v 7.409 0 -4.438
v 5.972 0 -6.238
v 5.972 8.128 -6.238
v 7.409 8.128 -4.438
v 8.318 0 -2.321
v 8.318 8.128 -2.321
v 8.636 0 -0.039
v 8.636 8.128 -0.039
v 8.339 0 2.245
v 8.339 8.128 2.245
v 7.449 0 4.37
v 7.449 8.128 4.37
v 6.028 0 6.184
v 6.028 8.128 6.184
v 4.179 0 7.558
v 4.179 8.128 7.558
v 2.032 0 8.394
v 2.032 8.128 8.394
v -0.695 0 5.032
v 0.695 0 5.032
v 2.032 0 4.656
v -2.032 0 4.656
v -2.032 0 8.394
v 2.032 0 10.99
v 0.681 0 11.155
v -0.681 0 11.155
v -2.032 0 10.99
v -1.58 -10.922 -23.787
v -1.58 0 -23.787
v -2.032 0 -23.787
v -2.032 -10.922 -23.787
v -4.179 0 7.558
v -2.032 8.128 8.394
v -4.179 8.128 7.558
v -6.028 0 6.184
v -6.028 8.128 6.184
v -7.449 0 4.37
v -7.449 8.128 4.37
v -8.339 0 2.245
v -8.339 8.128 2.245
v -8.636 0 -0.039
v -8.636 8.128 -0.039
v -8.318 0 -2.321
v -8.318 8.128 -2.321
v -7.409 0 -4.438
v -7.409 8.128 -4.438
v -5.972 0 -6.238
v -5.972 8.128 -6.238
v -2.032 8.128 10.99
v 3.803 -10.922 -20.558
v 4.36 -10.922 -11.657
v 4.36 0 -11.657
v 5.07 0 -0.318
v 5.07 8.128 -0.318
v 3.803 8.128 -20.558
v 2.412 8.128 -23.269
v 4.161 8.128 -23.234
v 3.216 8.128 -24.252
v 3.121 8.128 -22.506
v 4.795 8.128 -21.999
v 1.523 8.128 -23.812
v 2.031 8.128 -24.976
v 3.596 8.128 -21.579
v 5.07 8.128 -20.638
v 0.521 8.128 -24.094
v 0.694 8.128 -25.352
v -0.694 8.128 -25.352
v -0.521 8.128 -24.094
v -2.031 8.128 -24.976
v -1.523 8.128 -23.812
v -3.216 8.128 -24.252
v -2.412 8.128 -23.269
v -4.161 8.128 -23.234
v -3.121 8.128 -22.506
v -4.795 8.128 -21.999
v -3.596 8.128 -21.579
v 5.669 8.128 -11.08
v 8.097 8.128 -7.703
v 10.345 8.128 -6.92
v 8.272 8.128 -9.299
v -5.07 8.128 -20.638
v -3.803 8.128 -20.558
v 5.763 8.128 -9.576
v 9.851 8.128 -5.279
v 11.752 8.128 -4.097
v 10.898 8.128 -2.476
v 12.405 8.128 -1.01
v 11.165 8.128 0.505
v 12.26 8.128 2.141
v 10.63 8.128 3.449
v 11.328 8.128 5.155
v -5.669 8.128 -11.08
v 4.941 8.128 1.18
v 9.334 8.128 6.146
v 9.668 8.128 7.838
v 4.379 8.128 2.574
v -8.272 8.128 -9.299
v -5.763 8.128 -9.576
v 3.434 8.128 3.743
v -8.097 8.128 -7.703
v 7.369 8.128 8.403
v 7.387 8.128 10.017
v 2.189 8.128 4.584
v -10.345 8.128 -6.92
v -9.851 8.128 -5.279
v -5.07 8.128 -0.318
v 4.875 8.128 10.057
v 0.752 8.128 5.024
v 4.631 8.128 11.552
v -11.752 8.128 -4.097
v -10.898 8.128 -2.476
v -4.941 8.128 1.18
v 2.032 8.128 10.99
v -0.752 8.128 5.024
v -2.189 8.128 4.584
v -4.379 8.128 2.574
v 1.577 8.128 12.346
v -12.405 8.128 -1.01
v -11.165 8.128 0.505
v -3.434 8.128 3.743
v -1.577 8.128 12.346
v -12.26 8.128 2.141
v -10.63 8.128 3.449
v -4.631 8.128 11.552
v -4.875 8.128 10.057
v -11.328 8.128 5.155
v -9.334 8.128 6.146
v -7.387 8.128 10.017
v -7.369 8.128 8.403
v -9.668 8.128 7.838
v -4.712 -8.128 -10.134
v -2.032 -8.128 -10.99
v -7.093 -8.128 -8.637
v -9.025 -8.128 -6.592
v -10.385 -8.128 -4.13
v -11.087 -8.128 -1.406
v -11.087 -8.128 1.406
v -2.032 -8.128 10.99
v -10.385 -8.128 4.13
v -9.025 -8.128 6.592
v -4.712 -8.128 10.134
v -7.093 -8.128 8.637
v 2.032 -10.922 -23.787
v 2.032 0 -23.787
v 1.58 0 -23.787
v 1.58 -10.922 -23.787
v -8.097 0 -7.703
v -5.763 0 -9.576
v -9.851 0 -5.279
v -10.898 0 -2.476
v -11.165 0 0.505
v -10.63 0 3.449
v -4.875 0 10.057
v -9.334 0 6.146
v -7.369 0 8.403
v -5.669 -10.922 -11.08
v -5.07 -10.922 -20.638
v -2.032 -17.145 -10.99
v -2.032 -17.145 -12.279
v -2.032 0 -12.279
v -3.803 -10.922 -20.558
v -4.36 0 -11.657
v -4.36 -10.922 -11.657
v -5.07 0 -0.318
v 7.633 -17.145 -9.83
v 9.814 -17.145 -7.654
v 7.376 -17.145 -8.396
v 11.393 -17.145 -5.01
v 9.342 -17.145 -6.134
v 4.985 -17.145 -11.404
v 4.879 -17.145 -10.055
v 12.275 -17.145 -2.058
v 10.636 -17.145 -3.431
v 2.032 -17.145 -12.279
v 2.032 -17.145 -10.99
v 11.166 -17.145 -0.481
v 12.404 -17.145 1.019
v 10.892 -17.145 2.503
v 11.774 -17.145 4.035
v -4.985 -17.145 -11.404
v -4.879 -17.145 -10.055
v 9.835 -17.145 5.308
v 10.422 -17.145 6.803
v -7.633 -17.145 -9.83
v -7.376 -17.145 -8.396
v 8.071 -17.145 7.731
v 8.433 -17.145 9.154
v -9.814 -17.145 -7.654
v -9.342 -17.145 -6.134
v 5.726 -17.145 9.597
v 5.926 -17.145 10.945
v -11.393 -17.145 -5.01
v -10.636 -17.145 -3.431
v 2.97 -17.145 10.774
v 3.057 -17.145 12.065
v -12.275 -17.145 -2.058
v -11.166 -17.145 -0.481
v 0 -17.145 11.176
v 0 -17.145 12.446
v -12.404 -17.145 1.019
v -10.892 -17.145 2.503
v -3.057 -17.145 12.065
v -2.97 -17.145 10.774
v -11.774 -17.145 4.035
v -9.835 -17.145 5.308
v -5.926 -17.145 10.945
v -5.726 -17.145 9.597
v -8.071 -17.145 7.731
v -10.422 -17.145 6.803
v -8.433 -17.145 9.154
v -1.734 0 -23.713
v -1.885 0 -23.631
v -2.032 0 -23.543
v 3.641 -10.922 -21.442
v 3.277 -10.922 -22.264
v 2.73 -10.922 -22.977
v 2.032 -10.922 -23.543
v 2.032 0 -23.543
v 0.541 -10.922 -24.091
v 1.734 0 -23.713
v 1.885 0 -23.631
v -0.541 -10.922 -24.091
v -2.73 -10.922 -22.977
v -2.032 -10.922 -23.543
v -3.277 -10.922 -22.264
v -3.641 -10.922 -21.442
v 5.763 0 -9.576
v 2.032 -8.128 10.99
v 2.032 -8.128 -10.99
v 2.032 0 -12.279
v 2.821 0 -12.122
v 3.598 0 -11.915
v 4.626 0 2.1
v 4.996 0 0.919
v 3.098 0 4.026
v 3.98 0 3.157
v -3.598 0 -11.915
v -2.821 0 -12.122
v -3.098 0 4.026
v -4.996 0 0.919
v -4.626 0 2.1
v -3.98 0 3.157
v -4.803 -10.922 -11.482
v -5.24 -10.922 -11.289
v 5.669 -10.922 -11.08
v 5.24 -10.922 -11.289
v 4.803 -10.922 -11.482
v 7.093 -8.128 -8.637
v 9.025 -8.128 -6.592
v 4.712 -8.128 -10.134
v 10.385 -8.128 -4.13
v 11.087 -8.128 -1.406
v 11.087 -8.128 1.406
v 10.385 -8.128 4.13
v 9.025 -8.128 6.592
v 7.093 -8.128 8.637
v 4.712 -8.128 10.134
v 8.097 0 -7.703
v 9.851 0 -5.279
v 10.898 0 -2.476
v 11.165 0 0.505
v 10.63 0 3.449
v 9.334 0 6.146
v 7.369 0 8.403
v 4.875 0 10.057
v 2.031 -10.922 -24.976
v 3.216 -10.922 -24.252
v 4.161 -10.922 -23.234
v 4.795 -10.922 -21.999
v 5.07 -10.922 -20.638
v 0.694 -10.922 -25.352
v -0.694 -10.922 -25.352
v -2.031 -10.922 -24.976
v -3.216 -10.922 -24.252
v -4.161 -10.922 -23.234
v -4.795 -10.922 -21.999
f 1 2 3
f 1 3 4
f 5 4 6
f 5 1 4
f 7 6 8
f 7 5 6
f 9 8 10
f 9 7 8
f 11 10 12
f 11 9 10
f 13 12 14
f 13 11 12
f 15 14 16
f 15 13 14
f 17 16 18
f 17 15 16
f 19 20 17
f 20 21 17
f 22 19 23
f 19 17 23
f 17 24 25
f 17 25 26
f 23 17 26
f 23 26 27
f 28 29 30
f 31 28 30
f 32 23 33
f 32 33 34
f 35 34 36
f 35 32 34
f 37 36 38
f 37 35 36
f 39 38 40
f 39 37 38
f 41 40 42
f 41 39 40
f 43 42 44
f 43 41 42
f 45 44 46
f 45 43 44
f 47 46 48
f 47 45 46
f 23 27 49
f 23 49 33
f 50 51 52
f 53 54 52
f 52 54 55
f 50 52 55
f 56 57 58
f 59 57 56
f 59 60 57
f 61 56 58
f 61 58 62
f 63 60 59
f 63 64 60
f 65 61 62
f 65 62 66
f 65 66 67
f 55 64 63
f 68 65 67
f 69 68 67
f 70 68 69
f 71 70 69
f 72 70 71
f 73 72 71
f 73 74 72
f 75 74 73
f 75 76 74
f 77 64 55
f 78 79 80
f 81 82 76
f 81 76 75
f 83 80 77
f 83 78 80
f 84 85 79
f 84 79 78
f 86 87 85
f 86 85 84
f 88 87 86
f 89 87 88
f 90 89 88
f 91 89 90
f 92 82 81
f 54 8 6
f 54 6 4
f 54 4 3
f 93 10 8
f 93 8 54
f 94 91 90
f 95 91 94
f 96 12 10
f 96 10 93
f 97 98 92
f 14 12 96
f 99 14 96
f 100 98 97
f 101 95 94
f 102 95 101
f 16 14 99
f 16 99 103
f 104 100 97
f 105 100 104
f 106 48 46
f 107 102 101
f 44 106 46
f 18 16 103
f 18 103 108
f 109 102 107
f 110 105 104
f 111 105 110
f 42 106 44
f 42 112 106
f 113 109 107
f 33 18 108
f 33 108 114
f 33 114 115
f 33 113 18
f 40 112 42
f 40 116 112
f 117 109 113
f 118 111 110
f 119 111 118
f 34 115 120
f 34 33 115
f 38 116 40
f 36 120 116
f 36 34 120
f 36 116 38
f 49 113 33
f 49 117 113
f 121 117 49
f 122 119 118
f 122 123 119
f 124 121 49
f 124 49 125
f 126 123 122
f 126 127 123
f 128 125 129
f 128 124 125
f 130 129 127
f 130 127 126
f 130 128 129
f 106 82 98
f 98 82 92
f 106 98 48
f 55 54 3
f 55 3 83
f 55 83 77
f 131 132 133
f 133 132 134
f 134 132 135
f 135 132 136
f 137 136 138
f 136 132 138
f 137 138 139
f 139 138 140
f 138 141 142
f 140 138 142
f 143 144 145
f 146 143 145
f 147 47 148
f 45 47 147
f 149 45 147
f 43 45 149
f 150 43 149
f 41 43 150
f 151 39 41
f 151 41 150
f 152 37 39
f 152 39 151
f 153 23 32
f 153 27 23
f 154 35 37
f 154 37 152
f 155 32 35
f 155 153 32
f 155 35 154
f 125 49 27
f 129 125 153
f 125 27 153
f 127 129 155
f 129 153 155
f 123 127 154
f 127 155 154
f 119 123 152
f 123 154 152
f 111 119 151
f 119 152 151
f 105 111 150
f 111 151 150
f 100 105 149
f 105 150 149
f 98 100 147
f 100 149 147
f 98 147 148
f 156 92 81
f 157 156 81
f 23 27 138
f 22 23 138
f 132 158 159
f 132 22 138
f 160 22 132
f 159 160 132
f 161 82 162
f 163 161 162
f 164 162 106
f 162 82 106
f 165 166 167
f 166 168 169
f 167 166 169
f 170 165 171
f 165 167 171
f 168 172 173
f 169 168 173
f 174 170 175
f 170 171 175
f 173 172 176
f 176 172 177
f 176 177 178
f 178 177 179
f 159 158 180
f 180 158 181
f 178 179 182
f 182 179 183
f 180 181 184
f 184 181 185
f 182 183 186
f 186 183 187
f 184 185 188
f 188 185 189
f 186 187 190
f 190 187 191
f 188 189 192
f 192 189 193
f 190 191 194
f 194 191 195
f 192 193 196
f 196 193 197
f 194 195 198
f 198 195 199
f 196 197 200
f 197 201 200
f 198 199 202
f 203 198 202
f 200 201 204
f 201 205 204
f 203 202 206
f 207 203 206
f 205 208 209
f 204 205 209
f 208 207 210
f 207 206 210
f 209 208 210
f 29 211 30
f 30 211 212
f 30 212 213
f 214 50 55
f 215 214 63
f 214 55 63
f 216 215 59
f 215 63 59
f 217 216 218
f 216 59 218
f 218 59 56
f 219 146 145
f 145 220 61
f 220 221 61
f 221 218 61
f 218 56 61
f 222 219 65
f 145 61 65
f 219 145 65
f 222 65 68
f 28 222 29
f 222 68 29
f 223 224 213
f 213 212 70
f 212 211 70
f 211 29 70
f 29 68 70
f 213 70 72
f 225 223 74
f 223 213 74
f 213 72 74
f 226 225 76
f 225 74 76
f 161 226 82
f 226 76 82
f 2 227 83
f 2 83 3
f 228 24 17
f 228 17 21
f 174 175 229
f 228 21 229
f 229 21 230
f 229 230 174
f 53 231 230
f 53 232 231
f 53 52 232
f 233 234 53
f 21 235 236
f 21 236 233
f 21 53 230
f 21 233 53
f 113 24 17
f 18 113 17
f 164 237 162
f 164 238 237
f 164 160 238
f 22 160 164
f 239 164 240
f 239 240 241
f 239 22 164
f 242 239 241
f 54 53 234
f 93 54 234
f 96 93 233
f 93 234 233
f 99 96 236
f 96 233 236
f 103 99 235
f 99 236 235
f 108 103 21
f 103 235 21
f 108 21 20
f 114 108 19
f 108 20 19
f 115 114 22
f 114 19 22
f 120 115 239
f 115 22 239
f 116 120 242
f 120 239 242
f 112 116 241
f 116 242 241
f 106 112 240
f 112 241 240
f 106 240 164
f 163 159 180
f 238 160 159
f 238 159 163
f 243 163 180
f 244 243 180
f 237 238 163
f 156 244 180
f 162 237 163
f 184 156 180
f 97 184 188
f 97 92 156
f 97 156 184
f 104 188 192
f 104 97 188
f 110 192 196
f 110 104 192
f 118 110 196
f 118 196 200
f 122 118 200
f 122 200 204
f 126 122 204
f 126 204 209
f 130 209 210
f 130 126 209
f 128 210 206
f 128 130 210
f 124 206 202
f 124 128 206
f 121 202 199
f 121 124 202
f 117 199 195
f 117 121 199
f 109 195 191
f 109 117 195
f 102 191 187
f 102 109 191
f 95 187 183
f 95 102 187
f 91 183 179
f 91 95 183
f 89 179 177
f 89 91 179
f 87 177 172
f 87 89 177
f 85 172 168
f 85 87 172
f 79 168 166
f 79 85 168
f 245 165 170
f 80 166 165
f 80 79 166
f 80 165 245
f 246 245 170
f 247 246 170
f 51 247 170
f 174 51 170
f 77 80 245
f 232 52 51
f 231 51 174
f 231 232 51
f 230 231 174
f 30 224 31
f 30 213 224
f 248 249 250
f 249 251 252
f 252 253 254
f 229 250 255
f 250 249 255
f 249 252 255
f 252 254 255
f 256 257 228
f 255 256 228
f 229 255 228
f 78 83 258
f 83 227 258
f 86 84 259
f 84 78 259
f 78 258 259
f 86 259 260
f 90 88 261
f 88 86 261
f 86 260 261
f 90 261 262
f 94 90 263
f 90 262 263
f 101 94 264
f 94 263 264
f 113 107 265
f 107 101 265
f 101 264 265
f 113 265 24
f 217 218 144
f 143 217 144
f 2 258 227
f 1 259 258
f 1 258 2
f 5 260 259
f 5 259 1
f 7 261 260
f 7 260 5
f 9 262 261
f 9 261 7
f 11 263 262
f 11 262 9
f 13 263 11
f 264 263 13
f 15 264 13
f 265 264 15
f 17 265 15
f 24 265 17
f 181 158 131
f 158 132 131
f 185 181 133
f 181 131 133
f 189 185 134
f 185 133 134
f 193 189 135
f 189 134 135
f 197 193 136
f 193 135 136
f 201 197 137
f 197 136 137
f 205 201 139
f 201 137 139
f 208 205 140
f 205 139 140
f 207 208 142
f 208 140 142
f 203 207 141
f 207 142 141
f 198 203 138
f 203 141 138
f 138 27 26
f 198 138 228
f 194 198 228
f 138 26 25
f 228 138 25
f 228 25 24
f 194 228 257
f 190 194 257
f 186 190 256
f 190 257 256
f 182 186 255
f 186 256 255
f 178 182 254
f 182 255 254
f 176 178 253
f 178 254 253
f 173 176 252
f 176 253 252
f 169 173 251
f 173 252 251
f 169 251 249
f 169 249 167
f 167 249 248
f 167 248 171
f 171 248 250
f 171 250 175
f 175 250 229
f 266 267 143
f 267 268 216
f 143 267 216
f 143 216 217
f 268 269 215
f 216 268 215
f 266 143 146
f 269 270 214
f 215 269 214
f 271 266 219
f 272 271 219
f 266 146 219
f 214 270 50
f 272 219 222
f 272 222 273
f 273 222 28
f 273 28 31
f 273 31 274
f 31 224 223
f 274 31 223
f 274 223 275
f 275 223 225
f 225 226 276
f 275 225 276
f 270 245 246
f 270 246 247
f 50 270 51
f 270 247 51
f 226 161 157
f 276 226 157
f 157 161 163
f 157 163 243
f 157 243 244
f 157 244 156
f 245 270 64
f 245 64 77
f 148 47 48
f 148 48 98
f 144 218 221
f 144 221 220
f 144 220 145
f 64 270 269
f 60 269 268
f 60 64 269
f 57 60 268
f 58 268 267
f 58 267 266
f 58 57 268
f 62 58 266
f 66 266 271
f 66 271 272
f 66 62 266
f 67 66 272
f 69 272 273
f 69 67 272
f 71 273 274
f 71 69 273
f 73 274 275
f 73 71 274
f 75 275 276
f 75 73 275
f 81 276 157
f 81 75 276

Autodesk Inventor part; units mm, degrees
ref_plane "YZ Plane" through (0, 0, 0) normal (1, 0, 0) x (0, 1, 0)
ref_plane "XZ Plane" through (0, 0, 0) normal (0, 1, 0) x (-1, 0, 0)
ref_plane "XY Plane" through (0, 0, 0) normal (0, 0, 1) x (1, 0, 0)
sketch "Valve Handle" plane through (0, 0, 0) normal (0, 0, 1) x (1, 0, 0)
  line L0 (-2.032, 23.7871) -> (2.032, 23.7871)
  line L1 (-2.032, -23.7871) -> (2.032, -23.7871)
  line L2 (-2.032, 23.7871) -> (-2.032, -23.7871)
  line L3 (2.032, 23.7871) -> (2.032, -23.7871)
  line L4 (0, 11.176) -> (0, -22.606)
  line L5 (0, 11.176) -> (0, -22.606)
  point P0 (0, -1.7145)
  point P1 (0, 0)
  dimension "d146" = 33.782
  dimension "d167" = 11.176
  dimension "d168" = 22.606
sketch "Valve Casing" plane through (0, 0, 0) normal (0, 0, 1) x (1, 0, 0)
  circle A0 centre (0, 0) radius 8.636
  circle A1 centre (0, 0) radius 11.176
  circle A2 centre (0, 0) radius 12.446
  dimension "d149" = 24.892
sketch "Servo Arm Socket" plane through (0, 0, 0) normal (0, 0, 1) x (1, 0, 0)
  arc A0 (4.8166, -0.3016) -> (-4.8166, -0.3016) centre (0, 0) ccw
  line L0 (0, 0) -> (0, -20.32)
  arc A1 (-3.549, -20.5423) -> (3.549, -20.5423) centre (0, -20.32) ccw
  line L1 (-3.549, -20.5423) -> (-4.8166, -0.3016)
  line L2 (4.8166, -0.3016) -> (3.549, -20.5423)
  line L3 (-5.0701, -0.3175) -> (-3.8026, -20.5581)
  arc A2 (-3.8026, -20.5581) -> (3.8026, -20.5581) centre (0, -20.32) ccw
  line L4 (3.8026, -20.5581) -> (5.0701, -0.3175)
  arc A3 (5.0701, -0.3175) -> (-5.0701, -0.3175) centre (0, 0) ccw
  line L5 (-5.0701, -20.6375) -> (-6.3376, -0.3969)
  arc A4 (6.3376, -0.3969) -> (-6.3376, -0.3969) centre (0, 0) ccw
  line L6 (6.3376, -0.3969) -> (5.0701, -20.6375)
  arc A5 (-5.0701, -20.6375) -> (5.0701, -20.6375) centre (0, -20.32) ccw
  dimension "d162" = 9.652
  dimension "d163" = 20.32
  dimension "d164" = 7.112
  dimension "d165" = 0.254
  dimension "d166" = 1.27
sketch "Sketch10" plane through (0, 0, 0) normal (0, 1, 0) x (-1, 0, 0)
  line L0 (0, -14.097) -> (0, 0)
  line L1 (0, 23.7871) -> (0, -23.7871) construction
  line L2 (-2.032, 23.7871) -> (2.032, 23.7871)
  line L3 (-2.032, -23.7871) -> (2.032, -23.7871)
  line L4 (-2.032, 23.7871) -> (-2.032, -23.7871)
  line L5 (2.032, 23.7871) -> (2.032, -23.7871)
  line L6 (0, 11.176) -> (0, -22.606)
  line L7 (0, 11.176) -> (0, -22.606)
  circle A0 centre (0, 0) radius 8.636
  circle A1 centre (0, 0) radius 11.176
  circle A2 centre (0, 0) radius 12.446
  arc A3 (4.8166, -0.3016) -> (-4.8166, -0.3016) centre (0, 0) ccw
  line L8 (0, 0) -> (0, -20.32)
  arc A4 (-3.549, -20.5423) -> (3.549, -20.5423) centre (0, -20.32) ccw
  line L9 (-3.549, -20.5423) -> (-4.8166, -0.3016)
  line L10 (4.8166, -0.3016) -> (3.549, -20.5423)
  line L11 (-5.0701, -0.3175) -> (-3.8026, -20.5581)
  arc A5 (-3.8026, -20.5581) -> (3.8026, -20.5581) centre (0, -20.32) ccw
  line L12 (3.8026, -20.5581) -> (5.0701, -0.3175)
  arc A6 (5.0701, -0.3175) -> (-5.0701, -0.3175) centre (0, 0) ccw
  line L13 (-5.0701, -20.6375) -> (-6.3376, -0.3969)
  arc A7 (6.3376, -0.3969) -> (-6.3376, -0.3969) centre (0, 0) ccw
  line L14 (6.3376, -0.3969) -> (5.0701, -20.6375)
  arc A8 (-5.0701, -20.6375) -> (5.0701, -20.6375) centre (0, -20.32) ccw
  point P0 (2.032, -10.9897)
  point P1 (2.032, -12.279)
  point P2 (-2.032, -12.279)
  point P3 (-2.032, -10.9897)
  point P4 (-2.032, 10.9897)
  point P5 (2.032, 10.9897)
  point P6 (-6.1771, -11.0965)
  point P7 (6.1771, -11.0965)
  point P8 (6.4453, -9.1302)
  point P9 (7.0009, -5.0565)
  point P10 (2.032, 8.3935)
  point P11 (-2.032, 8.3935)
  point P12 (-7.0009, -5.0565)
  point P13 (6.1771, -11.0965)
  point P14 (-6.1771, -11.0965)
  point P15 (2.032, 7.3441)
  point P16 (-7.0009, -5.0565)
  point P17 (7.0009, -5.0565)
  point P18 (6.4453, -9.1302)
  point P19 (2.032, -19.4386)
  point P20 (-6.4453, -9.1302)
  point P21 (2.032, -8.3935)
  point P22 (-2.032, 7.3441)
  point P23 (-2.032, -19.4386)
  point P24 (-2.032, -8.3935)
  point P25 (-5.6686, -11.0802)
  point P26 (5.6686, -11.0802)
  point P27 (5.9718, -6.2385)
  point P28 (-5.9718, -6.2385)
  point P29 (5.7628, -9.5757)
  point P30 (-5.7628, -9.5757)
  point P31 (4.3599, -11.6574)
  point P32 (2.032, -23.5429)
  point P33 (1.5797, -23.7871)
  point P34 (-1.5797, -23.7871)
  point P35 (-2.032, -23.5429)
  point P36 (-4.3599, -11.6574)
extrude "Extrusion21" add sketch "Sketch10" against normal blind 17.145 contours A2 L9 A1 L4 | L5 A1 L10 A2 | A2 L11 A1 L9 | L10 A1 L12 A2 | A2 L13 A1 L11 | L12 A1 L14 A2 | A2 L4 A1 L13 | L14 A1 L5 A2 | A2 L5 A1 L4
extrude "Extrusion22" add sketch "Sketch10" against normal blind 8.128 contours A1 L9 A0 L4 | L5 A0 L10 A1 | A0 L9 A3 L4 | L5 A3 L10 A0 | A1 L11 A0 L9 | L10 A0 L12 A1 | A3 L9 A0 L11 A6 L4 | L5 A6 L12 A0 L10 A3 | A1 L13 A0 L11 | L12 A0 L14 A1 | A6 L11 A0 L13 A7 L4 | L5 A7 L14 A0 L12 A6 | A1 L4 A0 L13 | L14 A0 L5 A1 | A7 L13 A0 L4 | L5 A0 L14 A7
extrude "Extrusion25" add sketch "Sketch10" along normal blind 8.128 contours A5 L3 L4 | L4 L3 A5 L5 L12 A2 L14 A8 L13 L11 | A2 L13 A1 L11 | L5 L3 A5 | L12 A1 L14 A2 | A1 L13 A0 L11 | L12 A0 L14 A1 | A2 L4 A1 L13 | L14 A1 L5 A2 | A6 L4 A7 L6 | L6 A7 L5 A6 | A6 L11 A0 L13 A7 L4 | L5 A7 L14 A0 L12 A6 | A2 L5 A1 L4 | A7 L4 A0 L6 | L6 A0 L5 A7 | A7 L13 A0 L4 | L5 A0 L14 A7 | A1 L6 A0 L4 | L6 A1 L5 A0
sketch "Sketch11" plane through (0, 0, 0) normal (0, 0, 1) x (1, 0, 0)
  point P0 (0, 0)
extrude "Extrusion27" add sketch "Sketch10" against normal blind 10.922 contours L4 L3 A5 L5 L12 A2 L14 A8 L13 L11
properties part number "Servo Adapter 4"
